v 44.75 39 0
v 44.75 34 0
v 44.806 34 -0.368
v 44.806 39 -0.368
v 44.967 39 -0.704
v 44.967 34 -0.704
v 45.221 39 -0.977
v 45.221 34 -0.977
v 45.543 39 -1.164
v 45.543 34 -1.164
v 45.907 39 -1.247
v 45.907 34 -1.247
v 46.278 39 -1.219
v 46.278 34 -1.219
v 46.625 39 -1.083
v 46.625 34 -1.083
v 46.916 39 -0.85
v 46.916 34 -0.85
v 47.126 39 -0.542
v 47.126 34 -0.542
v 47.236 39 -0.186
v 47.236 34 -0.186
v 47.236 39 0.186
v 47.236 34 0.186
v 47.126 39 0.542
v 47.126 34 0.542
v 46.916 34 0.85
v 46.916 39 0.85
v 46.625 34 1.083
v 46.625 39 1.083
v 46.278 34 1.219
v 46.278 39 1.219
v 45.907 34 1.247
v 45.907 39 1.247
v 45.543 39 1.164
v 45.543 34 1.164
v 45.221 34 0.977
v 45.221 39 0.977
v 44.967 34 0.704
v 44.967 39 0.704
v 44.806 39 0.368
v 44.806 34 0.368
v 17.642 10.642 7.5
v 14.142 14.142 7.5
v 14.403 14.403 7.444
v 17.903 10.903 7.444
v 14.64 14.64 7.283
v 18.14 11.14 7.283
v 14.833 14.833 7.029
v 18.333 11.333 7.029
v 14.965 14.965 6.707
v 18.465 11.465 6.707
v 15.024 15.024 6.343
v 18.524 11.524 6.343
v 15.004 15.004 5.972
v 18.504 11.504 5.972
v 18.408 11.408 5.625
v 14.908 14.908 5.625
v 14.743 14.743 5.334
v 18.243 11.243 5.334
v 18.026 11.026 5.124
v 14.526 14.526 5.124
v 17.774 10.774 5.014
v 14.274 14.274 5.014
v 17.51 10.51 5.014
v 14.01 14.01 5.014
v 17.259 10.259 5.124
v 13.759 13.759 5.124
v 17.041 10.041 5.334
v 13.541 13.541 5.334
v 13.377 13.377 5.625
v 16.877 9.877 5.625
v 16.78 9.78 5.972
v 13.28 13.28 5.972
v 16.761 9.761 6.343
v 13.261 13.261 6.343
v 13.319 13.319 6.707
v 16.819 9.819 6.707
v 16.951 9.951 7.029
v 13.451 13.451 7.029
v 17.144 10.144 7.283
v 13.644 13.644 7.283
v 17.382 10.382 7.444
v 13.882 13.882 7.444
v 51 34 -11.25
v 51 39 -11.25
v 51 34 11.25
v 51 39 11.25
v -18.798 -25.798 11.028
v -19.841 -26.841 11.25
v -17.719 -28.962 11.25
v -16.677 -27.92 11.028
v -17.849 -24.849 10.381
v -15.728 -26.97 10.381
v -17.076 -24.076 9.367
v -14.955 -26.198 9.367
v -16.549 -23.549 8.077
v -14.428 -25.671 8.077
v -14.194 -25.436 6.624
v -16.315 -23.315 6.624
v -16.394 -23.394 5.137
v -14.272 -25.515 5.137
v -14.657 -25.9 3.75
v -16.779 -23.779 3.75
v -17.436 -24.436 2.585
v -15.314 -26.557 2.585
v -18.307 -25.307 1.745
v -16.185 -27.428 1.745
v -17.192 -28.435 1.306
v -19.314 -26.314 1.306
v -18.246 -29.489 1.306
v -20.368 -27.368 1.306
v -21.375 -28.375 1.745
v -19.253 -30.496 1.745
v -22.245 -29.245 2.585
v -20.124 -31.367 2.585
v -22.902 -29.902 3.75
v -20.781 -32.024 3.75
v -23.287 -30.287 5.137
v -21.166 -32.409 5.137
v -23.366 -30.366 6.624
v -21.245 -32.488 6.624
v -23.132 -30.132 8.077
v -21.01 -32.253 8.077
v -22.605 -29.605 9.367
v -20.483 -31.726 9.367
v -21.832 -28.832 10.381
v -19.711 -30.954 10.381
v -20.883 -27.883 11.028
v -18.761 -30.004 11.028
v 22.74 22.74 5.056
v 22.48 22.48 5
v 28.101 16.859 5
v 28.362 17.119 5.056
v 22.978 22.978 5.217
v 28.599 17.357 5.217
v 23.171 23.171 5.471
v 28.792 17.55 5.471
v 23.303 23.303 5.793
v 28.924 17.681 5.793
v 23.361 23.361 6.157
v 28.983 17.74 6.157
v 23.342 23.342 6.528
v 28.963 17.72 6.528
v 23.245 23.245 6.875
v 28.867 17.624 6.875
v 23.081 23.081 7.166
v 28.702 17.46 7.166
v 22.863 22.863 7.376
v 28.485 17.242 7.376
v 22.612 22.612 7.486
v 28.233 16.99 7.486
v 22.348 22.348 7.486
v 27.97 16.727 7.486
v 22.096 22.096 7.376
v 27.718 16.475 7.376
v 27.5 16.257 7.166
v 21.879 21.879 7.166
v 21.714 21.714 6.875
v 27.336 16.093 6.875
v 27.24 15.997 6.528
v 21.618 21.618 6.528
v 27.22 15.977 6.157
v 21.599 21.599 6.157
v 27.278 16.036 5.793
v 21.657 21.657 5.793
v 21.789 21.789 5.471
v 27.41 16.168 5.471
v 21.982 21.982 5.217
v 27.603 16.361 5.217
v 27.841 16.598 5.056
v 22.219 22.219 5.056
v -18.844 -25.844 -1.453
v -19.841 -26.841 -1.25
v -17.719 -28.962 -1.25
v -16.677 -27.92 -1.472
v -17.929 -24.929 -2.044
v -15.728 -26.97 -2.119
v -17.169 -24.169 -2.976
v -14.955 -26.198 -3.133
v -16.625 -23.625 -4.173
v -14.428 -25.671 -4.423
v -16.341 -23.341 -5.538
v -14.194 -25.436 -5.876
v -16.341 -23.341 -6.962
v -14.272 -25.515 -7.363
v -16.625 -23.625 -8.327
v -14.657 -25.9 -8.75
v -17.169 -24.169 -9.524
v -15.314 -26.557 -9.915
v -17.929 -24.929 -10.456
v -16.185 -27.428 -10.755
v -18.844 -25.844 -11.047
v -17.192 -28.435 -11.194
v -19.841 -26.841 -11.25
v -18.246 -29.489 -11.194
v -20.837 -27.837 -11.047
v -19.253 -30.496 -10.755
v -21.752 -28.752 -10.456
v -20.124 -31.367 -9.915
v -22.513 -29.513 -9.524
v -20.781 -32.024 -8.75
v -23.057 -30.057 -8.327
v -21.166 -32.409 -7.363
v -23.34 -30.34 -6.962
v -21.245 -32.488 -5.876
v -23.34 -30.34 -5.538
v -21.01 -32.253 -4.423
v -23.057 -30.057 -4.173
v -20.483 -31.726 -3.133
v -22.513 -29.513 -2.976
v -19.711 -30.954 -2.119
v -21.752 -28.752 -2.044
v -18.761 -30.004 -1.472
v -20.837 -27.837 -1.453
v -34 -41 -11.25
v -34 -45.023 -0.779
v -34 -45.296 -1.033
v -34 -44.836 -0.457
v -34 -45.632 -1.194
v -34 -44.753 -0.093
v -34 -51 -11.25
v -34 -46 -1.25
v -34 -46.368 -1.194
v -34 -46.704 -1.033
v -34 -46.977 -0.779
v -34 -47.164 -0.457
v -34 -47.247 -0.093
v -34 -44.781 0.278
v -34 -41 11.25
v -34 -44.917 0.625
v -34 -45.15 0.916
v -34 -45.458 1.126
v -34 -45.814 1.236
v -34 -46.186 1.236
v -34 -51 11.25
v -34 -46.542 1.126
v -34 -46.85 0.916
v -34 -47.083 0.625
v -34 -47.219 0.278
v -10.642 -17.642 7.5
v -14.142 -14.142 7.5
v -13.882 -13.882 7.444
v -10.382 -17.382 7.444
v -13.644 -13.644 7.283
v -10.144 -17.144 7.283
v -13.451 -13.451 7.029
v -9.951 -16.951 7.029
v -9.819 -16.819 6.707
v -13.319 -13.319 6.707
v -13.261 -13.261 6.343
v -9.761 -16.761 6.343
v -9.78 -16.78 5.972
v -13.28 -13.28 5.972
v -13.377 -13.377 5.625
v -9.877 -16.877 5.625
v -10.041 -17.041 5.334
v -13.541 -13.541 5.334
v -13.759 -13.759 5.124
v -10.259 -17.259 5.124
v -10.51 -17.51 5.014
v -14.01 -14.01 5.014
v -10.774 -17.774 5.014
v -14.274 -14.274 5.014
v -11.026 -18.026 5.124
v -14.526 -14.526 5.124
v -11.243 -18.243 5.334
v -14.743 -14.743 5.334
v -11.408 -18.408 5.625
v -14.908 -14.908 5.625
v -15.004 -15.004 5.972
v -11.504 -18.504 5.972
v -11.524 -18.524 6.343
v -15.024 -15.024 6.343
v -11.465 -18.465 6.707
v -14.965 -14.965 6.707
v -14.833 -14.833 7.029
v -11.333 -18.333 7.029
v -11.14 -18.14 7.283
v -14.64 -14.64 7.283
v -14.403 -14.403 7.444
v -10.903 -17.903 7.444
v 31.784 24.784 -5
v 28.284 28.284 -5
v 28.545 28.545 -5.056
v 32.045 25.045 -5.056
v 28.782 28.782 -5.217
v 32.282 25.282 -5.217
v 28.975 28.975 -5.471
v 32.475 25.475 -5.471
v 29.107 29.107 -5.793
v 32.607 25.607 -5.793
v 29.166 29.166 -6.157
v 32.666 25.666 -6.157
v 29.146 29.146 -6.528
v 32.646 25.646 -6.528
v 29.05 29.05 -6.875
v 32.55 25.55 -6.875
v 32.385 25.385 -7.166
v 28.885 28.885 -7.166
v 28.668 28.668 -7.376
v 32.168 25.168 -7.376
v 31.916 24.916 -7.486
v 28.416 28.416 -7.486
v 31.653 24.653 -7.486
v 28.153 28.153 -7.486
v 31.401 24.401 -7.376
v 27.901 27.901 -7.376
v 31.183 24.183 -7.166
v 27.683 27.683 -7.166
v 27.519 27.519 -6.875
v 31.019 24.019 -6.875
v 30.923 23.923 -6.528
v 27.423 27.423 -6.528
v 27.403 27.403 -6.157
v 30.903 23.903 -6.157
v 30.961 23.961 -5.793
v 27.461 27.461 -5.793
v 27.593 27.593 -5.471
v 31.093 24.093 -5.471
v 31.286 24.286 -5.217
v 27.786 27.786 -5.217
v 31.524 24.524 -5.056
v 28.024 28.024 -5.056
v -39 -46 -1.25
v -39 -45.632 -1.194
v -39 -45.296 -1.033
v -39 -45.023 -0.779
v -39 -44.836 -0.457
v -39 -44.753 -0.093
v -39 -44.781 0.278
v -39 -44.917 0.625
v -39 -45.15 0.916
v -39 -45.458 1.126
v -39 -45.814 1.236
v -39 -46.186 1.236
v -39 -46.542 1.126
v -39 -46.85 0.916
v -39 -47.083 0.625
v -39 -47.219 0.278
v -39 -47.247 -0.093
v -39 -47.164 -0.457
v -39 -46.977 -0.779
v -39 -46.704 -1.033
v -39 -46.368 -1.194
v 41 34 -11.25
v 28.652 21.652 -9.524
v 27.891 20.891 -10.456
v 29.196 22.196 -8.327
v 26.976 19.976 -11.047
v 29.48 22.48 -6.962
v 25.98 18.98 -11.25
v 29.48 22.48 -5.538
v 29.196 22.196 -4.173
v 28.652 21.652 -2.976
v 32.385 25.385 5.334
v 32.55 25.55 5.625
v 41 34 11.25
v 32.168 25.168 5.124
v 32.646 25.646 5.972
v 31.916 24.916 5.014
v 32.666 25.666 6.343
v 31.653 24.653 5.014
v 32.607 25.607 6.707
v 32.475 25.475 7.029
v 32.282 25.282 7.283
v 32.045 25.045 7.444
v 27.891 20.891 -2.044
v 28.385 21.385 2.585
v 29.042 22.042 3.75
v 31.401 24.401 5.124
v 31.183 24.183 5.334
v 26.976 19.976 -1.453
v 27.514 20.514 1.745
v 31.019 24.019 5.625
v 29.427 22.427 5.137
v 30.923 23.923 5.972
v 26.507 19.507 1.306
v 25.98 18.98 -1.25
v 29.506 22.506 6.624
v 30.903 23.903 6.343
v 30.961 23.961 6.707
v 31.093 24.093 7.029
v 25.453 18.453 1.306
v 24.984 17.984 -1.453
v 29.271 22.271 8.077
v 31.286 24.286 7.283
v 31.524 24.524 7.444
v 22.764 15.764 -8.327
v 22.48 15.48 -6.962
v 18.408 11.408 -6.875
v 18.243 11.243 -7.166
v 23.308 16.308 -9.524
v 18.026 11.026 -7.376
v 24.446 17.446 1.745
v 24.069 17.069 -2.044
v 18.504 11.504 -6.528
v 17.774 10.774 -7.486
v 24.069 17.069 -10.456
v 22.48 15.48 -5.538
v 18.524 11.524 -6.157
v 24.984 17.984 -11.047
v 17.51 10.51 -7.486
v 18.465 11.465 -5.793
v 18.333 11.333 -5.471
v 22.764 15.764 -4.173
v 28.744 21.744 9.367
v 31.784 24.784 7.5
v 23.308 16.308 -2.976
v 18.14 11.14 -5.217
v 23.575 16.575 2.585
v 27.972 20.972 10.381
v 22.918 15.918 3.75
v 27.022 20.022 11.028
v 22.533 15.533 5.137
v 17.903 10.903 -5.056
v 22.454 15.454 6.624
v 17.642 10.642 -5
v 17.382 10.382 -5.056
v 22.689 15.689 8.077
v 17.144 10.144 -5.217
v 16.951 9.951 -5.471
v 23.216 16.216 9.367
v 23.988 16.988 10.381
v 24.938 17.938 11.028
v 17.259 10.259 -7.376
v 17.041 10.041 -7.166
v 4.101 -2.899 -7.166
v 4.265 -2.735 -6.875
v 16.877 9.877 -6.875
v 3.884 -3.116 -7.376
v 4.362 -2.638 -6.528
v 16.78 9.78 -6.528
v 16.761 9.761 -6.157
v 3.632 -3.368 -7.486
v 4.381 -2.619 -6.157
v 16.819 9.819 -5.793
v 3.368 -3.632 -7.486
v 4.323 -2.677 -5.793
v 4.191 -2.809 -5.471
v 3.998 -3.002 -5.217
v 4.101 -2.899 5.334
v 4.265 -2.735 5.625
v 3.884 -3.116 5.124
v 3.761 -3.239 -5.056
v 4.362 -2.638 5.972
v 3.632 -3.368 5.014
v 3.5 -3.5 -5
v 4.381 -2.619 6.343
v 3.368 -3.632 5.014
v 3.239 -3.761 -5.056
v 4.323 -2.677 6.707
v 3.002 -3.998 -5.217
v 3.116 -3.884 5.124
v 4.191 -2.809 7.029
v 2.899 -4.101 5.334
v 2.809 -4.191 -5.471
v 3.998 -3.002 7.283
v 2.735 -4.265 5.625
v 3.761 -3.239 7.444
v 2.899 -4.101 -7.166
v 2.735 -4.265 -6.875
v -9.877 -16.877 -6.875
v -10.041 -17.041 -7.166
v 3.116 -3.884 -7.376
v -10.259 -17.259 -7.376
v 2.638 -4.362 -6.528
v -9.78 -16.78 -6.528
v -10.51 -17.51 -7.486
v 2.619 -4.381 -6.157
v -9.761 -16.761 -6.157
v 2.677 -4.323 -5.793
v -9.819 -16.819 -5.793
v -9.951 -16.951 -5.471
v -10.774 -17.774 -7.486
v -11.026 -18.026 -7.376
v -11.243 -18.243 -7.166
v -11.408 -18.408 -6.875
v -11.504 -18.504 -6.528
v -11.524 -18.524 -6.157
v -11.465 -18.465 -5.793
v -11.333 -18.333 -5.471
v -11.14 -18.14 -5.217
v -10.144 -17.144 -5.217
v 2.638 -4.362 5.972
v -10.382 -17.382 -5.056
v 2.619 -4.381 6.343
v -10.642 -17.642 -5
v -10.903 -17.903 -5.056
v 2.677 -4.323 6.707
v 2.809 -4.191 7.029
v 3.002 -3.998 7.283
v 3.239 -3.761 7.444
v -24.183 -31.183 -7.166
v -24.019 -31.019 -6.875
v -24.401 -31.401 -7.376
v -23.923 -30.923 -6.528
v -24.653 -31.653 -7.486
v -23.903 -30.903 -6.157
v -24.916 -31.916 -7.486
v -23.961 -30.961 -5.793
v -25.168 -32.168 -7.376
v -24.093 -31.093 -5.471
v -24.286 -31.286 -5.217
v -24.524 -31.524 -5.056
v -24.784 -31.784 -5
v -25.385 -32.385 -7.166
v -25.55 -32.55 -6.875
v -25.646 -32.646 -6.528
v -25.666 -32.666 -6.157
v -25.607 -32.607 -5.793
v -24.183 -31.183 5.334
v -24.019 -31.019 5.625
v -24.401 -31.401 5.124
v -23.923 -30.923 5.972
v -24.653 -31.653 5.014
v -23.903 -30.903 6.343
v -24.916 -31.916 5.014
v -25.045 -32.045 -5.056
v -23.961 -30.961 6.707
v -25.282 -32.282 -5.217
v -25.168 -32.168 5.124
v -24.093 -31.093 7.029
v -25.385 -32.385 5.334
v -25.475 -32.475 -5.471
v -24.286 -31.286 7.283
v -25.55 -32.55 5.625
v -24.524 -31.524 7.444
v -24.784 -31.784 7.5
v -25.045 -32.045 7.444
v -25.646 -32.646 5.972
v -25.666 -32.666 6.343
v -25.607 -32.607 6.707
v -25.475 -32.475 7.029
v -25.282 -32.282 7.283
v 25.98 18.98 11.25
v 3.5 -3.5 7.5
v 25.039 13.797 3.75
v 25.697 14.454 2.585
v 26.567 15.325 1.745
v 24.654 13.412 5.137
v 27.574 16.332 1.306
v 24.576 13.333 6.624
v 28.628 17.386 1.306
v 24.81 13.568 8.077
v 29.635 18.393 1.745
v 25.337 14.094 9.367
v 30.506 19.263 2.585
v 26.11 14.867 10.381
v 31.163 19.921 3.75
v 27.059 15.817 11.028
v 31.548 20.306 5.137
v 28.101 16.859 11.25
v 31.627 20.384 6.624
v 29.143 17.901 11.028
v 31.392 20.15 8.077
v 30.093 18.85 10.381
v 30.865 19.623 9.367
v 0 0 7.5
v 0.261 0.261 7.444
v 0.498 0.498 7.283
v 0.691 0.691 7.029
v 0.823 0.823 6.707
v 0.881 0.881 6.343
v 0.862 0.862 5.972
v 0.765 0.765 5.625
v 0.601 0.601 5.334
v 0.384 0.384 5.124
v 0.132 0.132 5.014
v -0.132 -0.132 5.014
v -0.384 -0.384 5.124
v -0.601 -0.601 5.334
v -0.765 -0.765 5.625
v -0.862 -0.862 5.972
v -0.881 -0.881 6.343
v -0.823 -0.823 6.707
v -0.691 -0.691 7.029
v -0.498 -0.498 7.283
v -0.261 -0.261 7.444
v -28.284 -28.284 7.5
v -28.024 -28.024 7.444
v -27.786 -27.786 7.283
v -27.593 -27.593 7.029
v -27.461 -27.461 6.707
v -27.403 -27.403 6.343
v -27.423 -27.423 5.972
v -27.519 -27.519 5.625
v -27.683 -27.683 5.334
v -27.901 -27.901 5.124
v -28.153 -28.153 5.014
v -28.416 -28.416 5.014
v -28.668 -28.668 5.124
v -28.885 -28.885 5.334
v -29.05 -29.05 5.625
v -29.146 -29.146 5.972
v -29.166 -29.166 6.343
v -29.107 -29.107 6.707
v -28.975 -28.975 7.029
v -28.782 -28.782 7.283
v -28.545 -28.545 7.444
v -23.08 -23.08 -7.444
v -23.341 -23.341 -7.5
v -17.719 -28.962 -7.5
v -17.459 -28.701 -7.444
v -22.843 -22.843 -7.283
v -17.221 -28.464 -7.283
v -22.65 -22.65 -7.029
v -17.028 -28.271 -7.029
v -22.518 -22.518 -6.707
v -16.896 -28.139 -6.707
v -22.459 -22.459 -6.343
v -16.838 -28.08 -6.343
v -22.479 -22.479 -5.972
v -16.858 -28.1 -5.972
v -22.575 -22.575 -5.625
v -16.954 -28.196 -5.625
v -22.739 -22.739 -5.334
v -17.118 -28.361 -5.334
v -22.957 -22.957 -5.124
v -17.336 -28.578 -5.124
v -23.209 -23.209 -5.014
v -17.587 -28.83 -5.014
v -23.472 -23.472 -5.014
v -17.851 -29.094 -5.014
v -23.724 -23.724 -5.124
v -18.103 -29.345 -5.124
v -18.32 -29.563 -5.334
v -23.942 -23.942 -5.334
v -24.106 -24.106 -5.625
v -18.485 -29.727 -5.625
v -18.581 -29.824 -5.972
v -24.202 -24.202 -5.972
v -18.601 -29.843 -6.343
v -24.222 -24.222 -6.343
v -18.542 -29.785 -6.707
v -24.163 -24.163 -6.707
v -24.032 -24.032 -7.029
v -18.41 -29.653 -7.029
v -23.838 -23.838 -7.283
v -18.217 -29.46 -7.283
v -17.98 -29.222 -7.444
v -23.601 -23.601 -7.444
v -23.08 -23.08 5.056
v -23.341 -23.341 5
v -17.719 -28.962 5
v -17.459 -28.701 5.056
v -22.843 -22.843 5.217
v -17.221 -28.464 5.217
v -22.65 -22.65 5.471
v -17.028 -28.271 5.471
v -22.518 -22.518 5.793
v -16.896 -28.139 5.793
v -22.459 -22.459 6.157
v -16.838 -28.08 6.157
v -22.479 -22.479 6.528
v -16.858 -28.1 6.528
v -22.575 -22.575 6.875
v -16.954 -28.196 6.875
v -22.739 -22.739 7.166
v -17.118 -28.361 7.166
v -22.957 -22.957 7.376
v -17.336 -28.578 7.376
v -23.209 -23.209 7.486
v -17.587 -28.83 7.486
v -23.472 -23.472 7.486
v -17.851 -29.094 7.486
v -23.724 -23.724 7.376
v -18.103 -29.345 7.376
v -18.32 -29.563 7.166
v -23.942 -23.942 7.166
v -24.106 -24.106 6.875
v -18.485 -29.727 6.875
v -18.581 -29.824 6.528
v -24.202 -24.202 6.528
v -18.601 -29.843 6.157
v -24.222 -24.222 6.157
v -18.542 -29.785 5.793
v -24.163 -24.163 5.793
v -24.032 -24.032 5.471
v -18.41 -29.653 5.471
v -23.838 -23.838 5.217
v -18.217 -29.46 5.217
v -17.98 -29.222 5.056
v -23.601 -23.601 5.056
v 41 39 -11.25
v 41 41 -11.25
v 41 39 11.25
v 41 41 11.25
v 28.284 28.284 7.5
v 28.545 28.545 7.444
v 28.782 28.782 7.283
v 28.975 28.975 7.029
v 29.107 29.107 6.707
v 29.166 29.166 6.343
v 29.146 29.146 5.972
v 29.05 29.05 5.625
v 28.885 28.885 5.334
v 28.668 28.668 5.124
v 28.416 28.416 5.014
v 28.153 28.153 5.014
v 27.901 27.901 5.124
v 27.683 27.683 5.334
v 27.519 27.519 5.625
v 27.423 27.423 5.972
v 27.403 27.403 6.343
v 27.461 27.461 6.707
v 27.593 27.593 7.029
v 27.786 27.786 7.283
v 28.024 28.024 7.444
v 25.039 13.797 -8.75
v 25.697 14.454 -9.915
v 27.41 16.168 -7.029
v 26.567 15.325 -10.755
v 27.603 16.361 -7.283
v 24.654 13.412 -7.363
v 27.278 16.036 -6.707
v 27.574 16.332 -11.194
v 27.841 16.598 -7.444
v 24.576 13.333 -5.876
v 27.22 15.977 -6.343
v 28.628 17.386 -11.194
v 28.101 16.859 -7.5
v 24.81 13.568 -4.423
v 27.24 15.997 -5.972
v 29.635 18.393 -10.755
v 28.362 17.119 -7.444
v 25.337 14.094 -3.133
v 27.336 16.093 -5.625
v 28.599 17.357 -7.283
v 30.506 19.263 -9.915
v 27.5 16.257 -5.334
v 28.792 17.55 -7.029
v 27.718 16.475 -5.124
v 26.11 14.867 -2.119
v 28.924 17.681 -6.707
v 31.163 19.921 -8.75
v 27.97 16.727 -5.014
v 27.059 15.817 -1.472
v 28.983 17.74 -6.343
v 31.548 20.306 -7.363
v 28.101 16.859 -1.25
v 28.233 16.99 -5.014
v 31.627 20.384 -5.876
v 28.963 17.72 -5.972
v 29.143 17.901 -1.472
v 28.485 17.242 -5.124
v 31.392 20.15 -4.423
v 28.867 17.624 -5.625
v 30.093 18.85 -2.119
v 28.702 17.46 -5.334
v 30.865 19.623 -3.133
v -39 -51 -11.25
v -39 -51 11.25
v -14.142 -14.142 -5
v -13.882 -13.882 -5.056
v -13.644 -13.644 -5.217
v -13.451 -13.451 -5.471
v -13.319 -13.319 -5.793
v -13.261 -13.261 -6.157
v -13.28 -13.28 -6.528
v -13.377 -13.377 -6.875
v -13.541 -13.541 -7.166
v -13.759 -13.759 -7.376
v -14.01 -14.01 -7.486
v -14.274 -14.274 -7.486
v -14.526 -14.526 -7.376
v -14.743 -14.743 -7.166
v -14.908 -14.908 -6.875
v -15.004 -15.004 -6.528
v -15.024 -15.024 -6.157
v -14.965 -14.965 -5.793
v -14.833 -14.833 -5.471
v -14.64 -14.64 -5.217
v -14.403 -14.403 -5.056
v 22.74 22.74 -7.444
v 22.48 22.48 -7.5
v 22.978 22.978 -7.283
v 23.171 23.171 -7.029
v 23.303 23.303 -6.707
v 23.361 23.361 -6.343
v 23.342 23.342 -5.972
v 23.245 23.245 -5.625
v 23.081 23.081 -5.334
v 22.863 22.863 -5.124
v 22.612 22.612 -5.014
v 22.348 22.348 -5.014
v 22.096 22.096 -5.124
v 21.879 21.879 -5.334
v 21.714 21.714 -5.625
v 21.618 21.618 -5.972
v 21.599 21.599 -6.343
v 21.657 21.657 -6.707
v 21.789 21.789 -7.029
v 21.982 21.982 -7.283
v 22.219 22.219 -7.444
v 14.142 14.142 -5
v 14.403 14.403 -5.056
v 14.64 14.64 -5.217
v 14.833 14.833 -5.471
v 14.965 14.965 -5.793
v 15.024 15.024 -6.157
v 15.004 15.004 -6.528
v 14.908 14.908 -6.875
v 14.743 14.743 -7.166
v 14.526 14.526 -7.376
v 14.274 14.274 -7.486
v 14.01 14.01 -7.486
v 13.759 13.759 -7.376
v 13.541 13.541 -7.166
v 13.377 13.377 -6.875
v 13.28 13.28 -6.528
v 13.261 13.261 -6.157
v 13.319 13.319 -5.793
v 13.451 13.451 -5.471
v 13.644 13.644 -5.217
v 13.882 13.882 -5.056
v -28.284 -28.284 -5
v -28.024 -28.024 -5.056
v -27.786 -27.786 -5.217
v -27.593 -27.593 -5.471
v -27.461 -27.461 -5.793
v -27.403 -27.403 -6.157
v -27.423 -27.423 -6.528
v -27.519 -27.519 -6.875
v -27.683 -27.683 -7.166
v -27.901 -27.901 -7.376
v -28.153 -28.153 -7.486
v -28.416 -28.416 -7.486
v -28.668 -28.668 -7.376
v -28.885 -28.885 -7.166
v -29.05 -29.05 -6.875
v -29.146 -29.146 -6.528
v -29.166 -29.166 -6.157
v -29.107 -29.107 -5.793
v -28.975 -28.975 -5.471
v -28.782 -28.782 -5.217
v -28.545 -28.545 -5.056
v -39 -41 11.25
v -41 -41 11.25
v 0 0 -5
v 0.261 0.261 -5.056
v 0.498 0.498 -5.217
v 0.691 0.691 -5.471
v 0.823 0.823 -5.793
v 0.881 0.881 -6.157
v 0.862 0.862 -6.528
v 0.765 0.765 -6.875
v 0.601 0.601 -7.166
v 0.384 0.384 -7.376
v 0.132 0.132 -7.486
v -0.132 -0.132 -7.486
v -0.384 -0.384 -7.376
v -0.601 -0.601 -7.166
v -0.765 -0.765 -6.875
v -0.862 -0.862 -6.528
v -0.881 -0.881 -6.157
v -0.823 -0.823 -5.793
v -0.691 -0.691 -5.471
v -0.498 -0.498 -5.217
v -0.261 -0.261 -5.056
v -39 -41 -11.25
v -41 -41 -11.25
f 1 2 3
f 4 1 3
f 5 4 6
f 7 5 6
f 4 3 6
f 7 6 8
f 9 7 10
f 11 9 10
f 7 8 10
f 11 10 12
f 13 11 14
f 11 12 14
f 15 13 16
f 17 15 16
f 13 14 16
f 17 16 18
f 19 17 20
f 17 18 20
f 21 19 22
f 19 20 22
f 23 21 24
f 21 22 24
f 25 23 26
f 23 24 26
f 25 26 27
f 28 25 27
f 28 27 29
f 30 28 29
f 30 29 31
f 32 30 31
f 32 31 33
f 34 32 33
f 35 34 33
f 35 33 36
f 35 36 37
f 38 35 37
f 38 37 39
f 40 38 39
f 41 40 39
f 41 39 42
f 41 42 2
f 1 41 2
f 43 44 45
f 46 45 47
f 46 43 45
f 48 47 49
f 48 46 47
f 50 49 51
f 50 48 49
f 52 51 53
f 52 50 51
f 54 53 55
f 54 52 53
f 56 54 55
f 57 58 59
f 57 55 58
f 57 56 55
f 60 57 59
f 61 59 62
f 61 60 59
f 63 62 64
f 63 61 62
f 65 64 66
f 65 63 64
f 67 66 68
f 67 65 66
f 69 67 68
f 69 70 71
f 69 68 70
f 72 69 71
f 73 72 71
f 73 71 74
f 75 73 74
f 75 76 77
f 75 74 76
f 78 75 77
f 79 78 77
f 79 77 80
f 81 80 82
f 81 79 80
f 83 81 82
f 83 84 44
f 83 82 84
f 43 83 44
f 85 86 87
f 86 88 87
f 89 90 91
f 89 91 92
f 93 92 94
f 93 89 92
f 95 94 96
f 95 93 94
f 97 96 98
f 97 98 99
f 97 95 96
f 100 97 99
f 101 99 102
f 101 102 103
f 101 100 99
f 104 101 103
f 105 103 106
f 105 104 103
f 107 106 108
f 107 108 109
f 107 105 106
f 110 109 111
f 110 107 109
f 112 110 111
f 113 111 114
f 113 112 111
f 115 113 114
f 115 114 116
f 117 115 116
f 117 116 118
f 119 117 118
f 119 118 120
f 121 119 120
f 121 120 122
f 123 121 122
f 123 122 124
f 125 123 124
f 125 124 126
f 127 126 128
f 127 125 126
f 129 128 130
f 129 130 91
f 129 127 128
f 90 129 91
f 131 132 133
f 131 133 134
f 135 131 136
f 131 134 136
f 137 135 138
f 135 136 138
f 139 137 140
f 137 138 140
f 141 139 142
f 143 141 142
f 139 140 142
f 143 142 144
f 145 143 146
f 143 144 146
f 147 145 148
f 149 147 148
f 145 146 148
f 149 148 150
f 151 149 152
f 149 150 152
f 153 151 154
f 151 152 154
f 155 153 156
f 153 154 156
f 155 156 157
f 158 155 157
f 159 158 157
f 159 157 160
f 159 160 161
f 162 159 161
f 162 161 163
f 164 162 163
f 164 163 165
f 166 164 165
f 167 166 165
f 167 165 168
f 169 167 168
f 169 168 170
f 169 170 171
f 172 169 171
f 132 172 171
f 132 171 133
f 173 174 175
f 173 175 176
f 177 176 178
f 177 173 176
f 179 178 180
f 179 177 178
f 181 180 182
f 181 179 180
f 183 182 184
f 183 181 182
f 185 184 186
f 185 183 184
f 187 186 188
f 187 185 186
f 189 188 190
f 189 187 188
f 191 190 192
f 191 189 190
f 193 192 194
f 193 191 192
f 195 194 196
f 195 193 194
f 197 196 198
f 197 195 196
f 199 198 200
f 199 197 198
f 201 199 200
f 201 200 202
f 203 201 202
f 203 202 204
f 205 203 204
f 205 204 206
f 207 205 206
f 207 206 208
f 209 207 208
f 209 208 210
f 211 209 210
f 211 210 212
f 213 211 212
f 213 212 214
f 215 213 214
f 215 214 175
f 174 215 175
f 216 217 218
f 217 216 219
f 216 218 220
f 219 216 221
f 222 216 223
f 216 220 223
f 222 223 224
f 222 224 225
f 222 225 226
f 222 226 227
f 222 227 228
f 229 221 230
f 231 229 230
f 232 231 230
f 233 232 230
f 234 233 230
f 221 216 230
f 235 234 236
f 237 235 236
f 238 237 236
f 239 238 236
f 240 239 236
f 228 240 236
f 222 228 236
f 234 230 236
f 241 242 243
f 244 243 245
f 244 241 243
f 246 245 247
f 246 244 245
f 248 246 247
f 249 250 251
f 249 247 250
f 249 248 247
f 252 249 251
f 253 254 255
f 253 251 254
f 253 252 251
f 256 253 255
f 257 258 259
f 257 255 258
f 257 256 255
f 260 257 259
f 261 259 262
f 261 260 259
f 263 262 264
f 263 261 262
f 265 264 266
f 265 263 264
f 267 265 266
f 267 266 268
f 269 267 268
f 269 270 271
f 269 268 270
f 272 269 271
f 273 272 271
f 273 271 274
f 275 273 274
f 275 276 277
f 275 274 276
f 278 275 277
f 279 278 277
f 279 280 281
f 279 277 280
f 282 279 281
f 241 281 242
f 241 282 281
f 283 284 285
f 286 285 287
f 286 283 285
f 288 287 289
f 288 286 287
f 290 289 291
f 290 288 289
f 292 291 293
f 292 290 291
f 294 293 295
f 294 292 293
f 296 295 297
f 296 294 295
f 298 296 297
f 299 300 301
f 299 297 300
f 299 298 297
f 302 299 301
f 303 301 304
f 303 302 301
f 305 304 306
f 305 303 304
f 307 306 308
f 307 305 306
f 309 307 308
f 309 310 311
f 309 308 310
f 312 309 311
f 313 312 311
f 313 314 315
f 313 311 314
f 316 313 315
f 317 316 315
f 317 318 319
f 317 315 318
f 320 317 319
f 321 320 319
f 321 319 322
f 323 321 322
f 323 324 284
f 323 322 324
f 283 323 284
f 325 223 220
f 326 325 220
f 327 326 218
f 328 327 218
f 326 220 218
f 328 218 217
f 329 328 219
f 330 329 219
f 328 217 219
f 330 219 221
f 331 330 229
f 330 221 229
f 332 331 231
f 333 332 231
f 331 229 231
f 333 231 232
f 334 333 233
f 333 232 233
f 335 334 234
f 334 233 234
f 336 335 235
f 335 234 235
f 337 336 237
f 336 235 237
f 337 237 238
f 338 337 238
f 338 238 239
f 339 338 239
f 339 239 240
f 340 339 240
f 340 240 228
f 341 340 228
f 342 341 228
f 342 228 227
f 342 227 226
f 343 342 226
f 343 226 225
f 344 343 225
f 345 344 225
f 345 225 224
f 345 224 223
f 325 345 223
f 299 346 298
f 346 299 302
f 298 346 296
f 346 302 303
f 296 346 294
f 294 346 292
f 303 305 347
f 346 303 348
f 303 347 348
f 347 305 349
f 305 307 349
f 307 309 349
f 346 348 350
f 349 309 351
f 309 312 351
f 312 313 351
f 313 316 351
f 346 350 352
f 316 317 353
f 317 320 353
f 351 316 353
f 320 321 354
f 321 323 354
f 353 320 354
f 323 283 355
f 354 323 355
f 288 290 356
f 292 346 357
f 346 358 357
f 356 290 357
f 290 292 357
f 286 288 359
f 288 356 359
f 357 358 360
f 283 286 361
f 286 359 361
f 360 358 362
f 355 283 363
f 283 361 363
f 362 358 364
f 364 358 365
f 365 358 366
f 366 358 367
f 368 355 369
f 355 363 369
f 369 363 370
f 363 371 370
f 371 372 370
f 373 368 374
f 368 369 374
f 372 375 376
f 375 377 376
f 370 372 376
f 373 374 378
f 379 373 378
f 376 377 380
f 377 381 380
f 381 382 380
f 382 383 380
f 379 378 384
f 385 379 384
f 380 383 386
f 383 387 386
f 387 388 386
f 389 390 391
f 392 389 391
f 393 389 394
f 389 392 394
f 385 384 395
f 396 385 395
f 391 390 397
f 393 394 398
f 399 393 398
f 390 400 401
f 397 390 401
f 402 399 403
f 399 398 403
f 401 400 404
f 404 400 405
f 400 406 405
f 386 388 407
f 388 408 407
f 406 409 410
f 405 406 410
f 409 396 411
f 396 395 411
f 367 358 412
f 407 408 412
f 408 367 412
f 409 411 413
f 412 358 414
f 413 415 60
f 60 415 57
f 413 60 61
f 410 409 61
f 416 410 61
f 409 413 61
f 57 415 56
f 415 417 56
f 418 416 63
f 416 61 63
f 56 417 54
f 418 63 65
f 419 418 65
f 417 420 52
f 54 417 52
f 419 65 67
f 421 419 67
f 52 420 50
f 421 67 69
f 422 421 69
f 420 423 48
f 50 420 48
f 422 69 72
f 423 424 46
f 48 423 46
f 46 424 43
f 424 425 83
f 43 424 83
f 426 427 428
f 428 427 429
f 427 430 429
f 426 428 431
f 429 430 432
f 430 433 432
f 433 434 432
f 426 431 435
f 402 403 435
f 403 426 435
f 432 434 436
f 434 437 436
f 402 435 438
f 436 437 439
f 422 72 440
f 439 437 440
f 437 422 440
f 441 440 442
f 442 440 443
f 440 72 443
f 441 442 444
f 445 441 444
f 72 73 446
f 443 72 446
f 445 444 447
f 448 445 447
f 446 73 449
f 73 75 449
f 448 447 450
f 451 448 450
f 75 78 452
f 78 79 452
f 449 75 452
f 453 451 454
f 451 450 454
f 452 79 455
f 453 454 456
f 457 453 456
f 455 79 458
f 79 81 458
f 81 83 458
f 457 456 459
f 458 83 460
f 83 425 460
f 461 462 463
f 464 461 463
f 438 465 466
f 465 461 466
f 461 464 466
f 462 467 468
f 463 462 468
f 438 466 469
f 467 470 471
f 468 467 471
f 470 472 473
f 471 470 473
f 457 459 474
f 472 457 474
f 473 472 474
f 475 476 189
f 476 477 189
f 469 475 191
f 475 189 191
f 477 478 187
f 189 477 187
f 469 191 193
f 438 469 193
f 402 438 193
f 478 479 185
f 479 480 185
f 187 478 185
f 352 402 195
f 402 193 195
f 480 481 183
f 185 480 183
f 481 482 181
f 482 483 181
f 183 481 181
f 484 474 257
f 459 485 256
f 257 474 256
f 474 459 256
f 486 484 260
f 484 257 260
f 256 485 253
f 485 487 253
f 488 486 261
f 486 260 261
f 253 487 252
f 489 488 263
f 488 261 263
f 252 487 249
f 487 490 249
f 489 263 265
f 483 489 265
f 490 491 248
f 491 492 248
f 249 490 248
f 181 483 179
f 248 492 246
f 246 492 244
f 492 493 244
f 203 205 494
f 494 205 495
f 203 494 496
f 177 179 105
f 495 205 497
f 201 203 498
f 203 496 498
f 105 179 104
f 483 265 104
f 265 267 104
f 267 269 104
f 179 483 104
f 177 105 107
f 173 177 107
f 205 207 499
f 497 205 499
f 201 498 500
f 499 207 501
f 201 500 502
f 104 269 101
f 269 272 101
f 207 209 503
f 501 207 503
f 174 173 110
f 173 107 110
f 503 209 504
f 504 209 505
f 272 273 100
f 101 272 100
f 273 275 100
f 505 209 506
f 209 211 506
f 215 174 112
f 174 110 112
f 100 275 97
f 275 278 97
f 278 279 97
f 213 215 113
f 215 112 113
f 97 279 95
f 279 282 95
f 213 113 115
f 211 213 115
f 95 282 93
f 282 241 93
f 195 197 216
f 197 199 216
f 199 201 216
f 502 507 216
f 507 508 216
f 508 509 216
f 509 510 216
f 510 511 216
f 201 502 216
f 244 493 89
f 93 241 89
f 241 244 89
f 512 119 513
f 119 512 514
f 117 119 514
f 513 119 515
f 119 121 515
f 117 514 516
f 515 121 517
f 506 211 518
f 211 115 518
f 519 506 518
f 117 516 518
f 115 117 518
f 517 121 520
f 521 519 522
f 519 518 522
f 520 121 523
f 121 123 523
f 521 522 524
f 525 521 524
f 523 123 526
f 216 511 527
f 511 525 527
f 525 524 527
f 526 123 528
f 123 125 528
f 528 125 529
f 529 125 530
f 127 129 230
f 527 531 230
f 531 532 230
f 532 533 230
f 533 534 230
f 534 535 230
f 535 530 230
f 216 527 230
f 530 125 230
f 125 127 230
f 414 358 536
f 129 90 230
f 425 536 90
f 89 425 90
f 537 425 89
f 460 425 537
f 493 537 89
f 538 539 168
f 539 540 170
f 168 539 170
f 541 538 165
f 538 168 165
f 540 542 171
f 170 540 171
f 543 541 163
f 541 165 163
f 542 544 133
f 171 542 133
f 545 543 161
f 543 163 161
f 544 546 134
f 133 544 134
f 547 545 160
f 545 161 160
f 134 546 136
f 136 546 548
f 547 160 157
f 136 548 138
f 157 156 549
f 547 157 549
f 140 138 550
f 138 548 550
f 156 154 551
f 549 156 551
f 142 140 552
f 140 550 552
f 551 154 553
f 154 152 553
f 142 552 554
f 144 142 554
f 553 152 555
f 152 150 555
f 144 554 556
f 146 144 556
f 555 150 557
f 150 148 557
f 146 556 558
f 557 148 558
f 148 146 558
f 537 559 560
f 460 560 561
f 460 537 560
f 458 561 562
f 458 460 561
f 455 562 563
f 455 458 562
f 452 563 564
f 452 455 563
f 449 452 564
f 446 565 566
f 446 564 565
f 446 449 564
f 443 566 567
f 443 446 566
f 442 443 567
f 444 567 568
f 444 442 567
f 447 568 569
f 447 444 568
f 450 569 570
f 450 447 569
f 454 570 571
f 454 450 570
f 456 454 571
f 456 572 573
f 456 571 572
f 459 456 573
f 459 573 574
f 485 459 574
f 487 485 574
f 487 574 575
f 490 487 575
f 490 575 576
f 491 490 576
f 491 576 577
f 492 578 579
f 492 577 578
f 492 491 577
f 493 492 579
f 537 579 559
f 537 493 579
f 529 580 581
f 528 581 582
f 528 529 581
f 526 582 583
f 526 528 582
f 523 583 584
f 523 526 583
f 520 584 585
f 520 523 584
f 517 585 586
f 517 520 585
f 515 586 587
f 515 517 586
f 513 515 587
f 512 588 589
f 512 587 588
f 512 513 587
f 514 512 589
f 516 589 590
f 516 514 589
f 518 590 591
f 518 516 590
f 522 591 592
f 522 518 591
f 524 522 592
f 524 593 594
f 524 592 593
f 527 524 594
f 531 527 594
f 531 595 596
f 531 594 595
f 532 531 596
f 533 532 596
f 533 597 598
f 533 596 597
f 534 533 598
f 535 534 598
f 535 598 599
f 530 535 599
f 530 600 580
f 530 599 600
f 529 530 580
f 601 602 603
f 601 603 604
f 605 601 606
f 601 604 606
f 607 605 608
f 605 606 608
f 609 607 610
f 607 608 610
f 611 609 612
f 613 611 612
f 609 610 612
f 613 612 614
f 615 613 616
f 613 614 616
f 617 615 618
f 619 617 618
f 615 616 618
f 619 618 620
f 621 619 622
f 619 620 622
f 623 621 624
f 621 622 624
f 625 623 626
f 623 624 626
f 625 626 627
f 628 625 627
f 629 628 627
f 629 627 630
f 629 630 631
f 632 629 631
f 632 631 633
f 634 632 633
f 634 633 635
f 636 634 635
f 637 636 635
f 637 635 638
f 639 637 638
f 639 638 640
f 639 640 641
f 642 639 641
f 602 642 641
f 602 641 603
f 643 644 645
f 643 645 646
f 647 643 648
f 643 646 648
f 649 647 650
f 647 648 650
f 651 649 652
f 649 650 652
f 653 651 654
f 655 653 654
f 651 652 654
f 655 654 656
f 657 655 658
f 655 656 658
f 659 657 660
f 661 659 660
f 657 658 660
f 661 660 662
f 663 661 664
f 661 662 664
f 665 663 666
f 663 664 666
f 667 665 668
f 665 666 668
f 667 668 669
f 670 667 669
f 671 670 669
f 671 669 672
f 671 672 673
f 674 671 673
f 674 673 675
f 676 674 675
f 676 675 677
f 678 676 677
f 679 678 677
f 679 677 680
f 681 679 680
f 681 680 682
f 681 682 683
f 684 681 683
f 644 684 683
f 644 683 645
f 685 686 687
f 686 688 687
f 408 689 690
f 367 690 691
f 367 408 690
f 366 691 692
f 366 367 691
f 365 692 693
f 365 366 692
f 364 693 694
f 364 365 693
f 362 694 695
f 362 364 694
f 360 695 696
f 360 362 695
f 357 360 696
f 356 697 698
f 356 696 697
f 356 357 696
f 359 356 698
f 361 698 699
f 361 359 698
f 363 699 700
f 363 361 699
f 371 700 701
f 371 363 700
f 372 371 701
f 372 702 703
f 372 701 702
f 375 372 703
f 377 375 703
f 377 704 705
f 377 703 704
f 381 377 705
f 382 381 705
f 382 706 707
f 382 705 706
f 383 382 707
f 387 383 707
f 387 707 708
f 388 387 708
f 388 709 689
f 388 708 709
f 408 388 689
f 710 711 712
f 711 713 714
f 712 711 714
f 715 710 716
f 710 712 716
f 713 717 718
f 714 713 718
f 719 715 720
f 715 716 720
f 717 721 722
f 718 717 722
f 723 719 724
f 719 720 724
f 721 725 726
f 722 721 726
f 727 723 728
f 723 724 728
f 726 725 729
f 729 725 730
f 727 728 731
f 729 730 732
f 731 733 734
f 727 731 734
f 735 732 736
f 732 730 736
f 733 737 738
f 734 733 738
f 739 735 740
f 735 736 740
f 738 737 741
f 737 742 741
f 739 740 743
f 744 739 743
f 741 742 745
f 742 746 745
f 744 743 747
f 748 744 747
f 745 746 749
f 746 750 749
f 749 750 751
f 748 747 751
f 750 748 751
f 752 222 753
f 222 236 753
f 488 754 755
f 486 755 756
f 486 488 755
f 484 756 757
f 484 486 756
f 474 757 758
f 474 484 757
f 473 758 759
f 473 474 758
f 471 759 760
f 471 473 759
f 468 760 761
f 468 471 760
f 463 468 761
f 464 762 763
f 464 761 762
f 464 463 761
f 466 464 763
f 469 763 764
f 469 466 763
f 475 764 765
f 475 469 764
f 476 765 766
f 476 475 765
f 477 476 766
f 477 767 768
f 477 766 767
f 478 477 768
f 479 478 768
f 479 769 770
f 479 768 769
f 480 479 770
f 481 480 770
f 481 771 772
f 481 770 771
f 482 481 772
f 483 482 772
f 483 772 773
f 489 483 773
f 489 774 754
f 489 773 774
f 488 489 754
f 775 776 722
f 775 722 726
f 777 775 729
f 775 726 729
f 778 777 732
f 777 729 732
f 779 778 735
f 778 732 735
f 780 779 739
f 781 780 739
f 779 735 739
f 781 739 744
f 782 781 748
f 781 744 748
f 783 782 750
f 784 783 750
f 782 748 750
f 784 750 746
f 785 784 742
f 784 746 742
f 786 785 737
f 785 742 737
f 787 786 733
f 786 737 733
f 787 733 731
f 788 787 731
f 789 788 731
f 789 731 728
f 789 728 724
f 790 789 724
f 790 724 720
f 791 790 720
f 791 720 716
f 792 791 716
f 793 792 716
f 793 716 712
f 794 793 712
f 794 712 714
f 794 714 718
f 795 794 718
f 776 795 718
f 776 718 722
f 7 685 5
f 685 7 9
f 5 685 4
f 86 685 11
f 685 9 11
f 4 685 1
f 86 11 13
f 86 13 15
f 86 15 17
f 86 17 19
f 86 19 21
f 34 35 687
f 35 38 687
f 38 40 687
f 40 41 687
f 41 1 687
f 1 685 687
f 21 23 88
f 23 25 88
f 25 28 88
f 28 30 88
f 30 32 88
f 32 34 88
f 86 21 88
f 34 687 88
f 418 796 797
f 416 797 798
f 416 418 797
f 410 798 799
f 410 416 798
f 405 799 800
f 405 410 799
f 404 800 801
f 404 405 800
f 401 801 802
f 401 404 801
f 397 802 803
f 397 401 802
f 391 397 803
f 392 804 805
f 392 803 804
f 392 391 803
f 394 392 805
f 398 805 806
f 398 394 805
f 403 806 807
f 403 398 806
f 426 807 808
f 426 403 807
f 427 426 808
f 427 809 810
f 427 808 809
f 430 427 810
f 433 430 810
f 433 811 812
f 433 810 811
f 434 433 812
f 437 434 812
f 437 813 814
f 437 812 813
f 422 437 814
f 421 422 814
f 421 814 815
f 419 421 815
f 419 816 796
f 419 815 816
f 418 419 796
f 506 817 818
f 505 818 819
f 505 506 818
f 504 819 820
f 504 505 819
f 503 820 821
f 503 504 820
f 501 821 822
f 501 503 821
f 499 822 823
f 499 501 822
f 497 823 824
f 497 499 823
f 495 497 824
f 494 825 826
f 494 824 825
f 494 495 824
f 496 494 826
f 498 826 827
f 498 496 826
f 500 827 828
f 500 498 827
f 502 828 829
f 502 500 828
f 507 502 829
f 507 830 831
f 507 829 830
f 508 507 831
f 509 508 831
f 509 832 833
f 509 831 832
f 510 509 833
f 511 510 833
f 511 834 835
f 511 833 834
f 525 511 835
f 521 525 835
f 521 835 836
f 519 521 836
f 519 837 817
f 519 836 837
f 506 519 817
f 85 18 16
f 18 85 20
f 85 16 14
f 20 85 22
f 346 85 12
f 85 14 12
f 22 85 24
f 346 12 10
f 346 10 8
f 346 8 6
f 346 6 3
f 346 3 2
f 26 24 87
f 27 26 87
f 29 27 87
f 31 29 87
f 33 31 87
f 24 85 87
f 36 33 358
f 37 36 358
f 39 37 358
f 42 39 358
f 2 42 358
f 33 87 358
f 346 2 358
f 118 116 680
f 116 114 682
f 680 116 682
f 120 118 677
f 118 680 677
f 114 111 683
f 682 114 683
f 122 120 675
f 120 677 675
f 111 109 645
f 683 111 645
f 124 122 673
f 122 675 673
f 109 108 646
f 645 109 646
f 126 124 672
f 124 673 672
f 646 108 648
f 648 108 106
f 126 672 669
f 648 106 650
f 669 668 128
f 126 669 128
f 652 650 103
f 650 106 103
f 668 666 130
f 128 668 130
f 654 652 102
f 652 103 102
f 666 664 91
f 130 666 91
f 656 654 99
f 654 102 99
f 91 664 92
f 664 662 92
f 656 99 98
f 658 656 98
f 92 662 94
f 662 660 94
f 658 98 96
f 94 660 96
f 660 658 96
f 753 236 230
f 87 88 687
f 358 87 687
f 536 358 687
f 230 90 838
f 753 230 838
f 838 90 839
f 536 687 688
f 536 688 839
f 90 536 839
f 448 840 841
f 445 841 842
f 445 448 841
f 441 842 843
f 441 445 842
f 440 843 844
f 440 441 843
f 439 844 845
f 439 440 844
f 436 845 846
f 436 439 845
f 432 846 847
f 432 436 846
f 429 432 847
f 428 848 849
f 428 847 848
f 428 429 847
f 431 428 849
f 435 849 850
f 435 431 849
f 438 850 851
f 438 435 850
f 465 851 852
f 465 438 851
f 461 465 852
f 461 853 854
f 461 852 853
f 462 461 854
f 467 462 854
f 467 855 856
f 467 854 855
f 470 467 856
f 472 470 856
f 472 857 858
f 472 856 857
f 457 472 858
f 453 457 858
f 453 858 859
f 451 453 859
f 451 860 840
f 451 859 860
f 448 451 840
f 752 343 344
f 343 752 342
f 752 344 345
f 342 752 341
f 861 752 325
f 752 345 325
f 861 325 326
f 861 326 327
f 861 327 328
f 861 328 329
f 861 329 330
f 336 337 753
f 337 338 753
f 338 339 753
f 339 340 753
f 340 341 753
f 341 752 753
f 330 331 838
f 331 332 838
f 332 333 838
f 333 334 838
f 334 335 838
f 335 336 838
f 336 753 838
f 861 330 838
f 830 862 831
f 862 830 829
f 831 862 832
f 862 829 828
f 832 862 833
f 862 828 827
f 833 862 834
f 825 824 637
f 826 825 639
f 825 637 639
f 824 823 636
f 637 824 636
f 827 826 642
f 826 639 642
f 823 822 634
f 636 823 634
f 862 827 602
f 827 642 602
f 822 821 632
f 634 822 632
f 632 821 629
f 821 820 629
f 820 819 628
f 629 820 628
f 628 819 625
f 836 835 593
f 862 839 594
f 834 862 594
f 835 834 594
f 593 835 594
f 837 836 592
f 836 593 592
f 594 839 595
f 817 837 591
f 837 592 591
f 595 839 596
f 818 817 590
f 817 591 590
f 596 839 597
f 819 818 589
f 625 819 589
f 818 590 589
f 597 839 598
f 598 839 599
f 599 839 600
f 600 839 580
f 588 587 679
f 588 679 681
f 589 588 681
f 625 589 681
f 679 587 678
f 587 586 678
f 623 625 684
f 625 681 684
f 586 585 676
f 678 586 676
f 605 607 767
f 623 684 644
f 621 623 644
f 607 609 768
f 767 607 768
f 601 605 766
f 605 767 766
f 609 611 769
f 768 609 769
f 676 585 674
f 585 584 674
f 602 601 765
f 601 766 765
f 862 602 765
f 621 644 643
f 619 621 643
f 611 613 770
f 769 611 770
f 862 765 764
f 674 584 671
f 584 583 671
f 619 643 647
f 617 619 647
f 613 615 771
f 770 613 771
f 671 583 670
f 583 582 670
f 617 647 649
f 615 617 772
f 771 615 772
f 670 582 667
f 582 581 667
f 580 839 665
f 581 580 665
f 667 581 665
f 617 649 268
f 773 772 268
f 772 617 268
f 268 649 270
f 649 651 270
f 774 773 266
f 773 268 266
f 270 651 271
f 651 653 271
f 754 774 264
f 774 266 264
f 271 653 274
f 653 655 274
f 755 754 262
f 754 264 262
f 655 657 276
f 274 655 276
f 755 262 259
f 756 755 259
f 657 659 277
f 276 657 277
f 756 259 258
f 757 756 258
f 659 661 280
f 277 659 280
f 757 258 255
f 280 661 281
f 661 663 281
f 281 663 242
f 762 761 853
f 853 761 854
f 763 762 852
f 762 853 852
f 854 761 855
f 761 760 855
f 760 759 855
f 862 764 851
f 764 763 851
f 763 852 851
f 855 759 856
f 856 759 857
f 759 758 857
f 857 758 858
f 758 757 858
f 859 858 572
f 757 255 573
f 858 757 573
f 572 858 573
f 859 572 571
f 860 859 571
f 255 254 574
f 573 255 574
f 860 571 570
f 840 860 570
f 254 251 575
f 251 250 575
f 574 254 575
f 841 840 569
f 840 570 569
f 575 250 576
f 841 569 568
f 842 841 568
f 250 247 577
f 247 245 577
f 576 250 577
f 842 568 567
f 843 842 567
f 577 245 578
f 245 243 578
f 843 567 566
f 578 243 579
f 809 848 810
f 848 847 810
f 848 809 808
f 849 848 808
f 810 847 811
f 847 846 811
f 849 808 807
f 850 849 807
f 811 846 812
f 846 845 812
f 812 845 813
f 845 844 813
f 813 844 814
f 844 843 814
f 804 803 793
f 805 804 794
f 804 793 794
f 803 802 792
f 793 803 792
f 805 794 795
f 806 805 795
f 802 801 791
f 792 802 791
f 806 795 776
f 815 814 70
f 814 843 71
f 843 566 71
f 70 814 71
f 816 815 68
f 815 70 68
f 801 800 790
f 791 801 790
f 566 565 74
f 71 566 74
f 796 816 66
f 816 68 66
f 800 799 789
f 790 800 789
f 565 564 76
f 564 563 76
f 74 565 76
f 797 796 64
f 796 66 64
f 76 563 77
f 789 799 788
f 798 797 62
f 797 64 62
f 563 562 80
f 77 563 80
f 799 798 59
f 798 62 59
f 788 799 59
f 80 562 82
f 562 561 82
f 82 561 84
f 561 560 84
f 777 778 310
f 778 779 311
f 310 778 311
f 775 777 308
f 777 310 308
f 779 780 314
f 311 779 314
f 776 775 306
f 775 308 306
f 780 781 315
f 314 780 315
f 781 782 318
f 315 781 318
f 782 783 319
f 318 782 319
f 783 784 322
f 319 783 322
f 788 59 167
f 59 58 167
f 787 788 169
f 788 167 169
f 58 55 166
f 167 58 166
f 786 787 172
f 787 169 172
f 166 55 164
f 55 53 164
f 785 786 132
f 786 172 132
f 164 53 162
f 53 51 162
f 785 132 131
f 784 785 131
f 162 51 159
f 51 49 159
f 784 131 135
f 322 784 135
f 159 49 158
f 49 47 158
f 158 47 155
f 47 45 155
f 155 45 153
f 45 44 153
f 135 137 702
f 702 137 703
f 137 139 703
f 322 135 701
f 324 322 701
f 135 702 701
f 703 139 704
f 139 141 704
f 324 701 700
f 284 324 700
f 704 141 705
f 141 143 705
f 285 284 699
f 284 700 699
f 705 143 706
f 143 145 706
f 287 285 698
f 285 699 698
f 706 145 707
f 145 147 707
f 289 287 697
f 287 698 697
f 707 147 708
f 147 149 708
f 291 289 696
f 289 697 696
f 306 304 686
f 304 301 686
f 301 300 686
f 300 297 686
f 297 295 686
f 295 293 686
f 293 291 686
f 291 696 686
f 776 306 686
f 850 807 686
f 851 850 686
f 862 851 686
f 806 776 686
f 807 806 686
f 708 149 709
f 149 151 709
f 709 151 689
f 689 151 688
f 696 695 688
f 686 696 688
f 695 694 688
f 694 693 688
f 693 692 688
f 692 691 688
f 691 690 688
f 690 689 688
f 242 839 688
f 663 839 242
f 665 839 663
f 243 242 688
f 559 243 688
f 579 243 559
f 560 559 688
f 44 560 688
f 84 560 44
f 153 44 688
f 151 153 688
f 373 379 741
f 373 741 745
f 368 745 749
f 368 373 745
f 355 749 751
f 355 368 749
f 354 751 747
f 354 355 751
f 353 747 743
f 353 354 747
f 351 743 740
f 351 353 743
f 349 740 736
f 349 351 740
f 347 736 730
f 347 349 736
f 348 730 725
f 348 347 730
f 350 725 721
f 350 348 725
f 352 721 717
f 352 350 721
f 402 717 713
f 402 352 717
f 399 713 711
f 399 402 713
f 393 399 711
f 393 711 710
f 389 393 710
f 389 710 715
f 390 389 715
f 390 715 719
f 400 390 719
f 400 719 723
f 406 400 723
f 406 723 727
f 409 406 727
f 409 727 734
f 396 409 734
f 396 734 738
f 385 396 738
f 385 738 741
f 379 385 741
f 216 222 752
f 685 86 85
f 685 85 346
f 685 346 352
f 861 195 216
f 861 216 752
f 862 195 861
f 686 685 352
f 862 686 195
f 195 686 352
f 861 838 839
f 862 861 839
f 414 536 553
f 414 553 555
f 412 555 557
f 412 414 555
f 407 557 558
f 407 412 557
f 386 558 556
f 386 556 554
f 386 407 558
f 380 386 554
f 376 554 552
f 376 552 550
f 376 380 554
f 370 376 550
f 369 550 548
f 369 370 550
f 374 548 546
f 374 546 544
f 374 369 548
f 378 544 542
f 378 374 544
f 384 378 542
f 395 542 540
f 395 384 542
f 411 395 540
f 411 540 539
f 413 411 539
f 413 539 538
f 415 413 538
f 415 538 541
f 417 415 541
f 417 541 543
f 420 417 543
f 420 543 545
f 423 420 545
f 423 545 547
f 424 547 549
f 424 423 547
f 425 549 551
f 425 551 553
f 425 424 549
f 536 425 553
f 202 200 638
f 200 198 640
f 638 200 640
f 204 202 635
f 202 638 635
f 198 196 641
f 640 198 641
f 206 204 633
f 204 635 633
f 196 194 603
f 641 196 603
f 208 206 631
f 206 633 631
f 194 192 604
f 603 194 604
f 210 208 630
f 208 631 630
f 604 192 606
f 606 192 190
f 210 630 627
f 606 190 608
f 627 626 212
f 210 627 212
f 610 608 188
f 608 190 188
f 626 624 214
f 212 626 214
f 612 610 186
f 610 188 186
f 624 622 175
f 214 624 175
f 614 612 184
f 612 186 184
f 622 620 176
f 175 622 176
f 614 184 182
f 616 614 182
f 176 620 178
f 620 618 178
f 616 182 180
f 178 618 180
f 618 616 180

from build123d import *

# Parameters (mm, degrees)
MAIN_DEPTH                = 11.25
SKETCH2_R                 = 1.25
FIXHOLE1_DEPTH            = 83
SKETCH3_R                 = 1.25
FIXHOLE2_DEPTH            = 83
SKETCH6_R                 = 1.25
CUT_EXTRUDE2_DEPTH        = 63.932503526
LPATTERN1_COUNT           = 5
LPATTERN1_PITCH           = 20
SKETCH7_R                 = 5
BOSS_EXTRUDE1_DEPTH       = 3
SKETCH8_R                 = 1.25
CUT_EXTRUDE3_DEPTH        = 66.932503526
LPATTERN2_COUNT           = 2
LPATTERN2_PITCH           = 12.5
LPATTERN2_COPY_1_SKETCH_R = 1.25
LPATTERN2_COPY_1_DEPTH    = 63.932503526
LPATTERN2_COPY_2_SKETCH_R = 1.25
LPATTERN2_COPY_2_DEPTH    = 63.932503526
LPATTERN2_COPY_3_SKETCH_R = 1.25
LPATTERN2_COPY_3_DEPTH    = 63.932503526
LPATTERN2_COPY_4_SKETCH_R = 1.25
LPATTERN2_COPY_4_DEPTH    = 63.932503526


with BuildPart() as part:
    # Sketch1 → Main (new body, symmetric)
    with BuildSketch(Plane.XY):
        Polygon((-41, -41), (41, 41), (41, 39), (51, 39), (51, 34), (41, 34), (-34, -41), (-34, -51), (-39, -51), (-39, -41), align=None)
    extrude(amount=MAIN_DEPTH, both=True)

    # Sketch2 → FixHole1 (cut, through all)
    with BuildSketch(Plane(origin=(41, 0, 0), x_dir=(0, 0, -1), z_dir=(1, 0, 0))):
        with Locations((0, -46)):
            Circle(SKETCH2_R)
    extrude(amount=-FIXHOLE1_DEPTH, mode=Mode.SUBTRACT)

    # Sketch3 → FixHole2 (cut, through all)
    with BuildSketch(Plane(origin=(0, -41, 0), x_dir=(-1, 0, 0), z_dir=(0, -1, 0))):
        with Locations((-46, 0)):
            Circle(SKETCH3_R)
    extrude(amount=-FIXHOLE2_DEPTH, mode=Mode.SUBTRACT)

    # Sketch6 → Cut-Extrude2 (cut, through all)
    with BuildSketch(Plane(origin=(3.5, -3.5, 0), x_dir=(0, 0, 1), z_dir=(-0.707106781, 0.707106781, 0))):
        with Locations((-6.25, 40)):
            Circle(SKETCH6_R)
    cut_extrude2 = extrude(amount=CUT_EXTRUDE2_DEPTH, mode=Mode.SUBTRACT)

    # LPattern1: Cut-Extrude2 ×5
    with Locations(*[Vector(-0.707106781, -0.707106781, 0) * (i * LPATTERN1_PITCH) for i in range(1, LPATTERN1_COUNT)]):
        add(cut_extrude2, mode=Mode.SUBTRACT)

    # Sketch7 → Boss-Extrude1 (add)
    with BuildSketch(Plane(origin=(3.5, -3.5, 0), x_dir=(0, 0, 1), z_dir=(-0.707106781, 0.707106781, 0))):
        with Locations((-6.25, -33.008531019)):
            Circle(SKETCH7_R)
        with Locations((-6.25, 31.791468981)):
            Circle(SKETCH7_R)
    boss_extrude1 = extrude(amount=-BOSS_EXTRUDE1_DEPTH)

    # Sketch8 → Cut-Extrude3 (cut, through all)
    with BuildSketch(Plane(origin=(5.621320344, -5.621320344, 0), x_dir=(0, 0, -1), z_dir=(0.707106781, -0.707106781, 0))):
        with Locations((6.25, 31.791468981)):
            Circle(SKETCH8_R)
        with Locations((6.25, -33.008531019)):
            Circle(SKETCH8_R)
    cut_extrude3 = extrude(amount=-CUT_EXTRUDE3_DEPTH, mode=Mode.SUBTRACT)

    # LPattern2: Boss-Extrude1, Cut-Extrude3, Cut-Extrude2 ×2
    with Locations(*[(0, 0, i * LPATTERN2_PITCH) for i in range(1, LPATTERN2_COUNT)]):
        add(boss_extrude1)
        add(cut_extrude3, mode=Mode.SUBTRACT)
        add(cut_extrude2, mode=Mode.SUBTRACT)

    # LPattern2 copy 1 sketch → LPattern2 copy 1 (cut, through all)
    with BuildSketch(Plane(origin=(-10.642135624, -17.642135624, 12.5), x_dir=(0, 0, 1), z_dir=(-0.707106781, 0.707106781, 0))):
        with Locations((-6.25, 40)):
            Circle(LPATTERN2_COPY_1_SKETCH_R)
    extrude(amount=LPATTERN2_COPY_1_DEPTH, mode=Mode.SUBTRACT)

    # LPattern2 copy 2 sketch → LPattern2 copy 2 (cut, through all)
    with BuildSketch(Plane(origin=(-24.784271247, -31.784271247, 12.5), x_dir=(0, 0, 1), z_dir=(-0.707106781, 0.707106781, 0))):
        with Locations((-6.25, 40)):
            Circle(LPATTERN2_COPY_2_SKETCH_R)
    extrude(amount=LPATTERN2_COPY_2_DEPTH, mode=Mode.SUBTRACT)

    # LPattern2 copy 3 sketch → LPattern2 copy 3 (cut, through all)
    with BuildSketch(Plane(origin=(-38.926406871, -45.926406871, 12.5), x_dir=(0, 0, 1), z_dir=(-0.707106781, 0.707106781, 0))):
        with Locations((-6.25, 40)):
            Circle(LPATTERN2_COPY_3_SKETCH_R)
    extrude(amount=LPATTERN2_COPY_3_DEPTH, mode=Mode.SUBTRACT)

    # LPattern2 copy 4 sketch → LPattern2 copy 4 (cut, through all)
    with BuildSketch(Plane(origin=(-53.068542495, -60.068542495, 12.5), x_dir=(0, 0, 1), z_dir=(-0.707106781, 0.707106781, 0))):
        with Locations((-6.25, 40)):
            Circle(LPATTERN2_COPY_4_SKETCH_R)
    extrude(amount=LPATTERN2_COPY_4_DEPTH, mode=Mode.SUBTRACT)


solid = part.part
